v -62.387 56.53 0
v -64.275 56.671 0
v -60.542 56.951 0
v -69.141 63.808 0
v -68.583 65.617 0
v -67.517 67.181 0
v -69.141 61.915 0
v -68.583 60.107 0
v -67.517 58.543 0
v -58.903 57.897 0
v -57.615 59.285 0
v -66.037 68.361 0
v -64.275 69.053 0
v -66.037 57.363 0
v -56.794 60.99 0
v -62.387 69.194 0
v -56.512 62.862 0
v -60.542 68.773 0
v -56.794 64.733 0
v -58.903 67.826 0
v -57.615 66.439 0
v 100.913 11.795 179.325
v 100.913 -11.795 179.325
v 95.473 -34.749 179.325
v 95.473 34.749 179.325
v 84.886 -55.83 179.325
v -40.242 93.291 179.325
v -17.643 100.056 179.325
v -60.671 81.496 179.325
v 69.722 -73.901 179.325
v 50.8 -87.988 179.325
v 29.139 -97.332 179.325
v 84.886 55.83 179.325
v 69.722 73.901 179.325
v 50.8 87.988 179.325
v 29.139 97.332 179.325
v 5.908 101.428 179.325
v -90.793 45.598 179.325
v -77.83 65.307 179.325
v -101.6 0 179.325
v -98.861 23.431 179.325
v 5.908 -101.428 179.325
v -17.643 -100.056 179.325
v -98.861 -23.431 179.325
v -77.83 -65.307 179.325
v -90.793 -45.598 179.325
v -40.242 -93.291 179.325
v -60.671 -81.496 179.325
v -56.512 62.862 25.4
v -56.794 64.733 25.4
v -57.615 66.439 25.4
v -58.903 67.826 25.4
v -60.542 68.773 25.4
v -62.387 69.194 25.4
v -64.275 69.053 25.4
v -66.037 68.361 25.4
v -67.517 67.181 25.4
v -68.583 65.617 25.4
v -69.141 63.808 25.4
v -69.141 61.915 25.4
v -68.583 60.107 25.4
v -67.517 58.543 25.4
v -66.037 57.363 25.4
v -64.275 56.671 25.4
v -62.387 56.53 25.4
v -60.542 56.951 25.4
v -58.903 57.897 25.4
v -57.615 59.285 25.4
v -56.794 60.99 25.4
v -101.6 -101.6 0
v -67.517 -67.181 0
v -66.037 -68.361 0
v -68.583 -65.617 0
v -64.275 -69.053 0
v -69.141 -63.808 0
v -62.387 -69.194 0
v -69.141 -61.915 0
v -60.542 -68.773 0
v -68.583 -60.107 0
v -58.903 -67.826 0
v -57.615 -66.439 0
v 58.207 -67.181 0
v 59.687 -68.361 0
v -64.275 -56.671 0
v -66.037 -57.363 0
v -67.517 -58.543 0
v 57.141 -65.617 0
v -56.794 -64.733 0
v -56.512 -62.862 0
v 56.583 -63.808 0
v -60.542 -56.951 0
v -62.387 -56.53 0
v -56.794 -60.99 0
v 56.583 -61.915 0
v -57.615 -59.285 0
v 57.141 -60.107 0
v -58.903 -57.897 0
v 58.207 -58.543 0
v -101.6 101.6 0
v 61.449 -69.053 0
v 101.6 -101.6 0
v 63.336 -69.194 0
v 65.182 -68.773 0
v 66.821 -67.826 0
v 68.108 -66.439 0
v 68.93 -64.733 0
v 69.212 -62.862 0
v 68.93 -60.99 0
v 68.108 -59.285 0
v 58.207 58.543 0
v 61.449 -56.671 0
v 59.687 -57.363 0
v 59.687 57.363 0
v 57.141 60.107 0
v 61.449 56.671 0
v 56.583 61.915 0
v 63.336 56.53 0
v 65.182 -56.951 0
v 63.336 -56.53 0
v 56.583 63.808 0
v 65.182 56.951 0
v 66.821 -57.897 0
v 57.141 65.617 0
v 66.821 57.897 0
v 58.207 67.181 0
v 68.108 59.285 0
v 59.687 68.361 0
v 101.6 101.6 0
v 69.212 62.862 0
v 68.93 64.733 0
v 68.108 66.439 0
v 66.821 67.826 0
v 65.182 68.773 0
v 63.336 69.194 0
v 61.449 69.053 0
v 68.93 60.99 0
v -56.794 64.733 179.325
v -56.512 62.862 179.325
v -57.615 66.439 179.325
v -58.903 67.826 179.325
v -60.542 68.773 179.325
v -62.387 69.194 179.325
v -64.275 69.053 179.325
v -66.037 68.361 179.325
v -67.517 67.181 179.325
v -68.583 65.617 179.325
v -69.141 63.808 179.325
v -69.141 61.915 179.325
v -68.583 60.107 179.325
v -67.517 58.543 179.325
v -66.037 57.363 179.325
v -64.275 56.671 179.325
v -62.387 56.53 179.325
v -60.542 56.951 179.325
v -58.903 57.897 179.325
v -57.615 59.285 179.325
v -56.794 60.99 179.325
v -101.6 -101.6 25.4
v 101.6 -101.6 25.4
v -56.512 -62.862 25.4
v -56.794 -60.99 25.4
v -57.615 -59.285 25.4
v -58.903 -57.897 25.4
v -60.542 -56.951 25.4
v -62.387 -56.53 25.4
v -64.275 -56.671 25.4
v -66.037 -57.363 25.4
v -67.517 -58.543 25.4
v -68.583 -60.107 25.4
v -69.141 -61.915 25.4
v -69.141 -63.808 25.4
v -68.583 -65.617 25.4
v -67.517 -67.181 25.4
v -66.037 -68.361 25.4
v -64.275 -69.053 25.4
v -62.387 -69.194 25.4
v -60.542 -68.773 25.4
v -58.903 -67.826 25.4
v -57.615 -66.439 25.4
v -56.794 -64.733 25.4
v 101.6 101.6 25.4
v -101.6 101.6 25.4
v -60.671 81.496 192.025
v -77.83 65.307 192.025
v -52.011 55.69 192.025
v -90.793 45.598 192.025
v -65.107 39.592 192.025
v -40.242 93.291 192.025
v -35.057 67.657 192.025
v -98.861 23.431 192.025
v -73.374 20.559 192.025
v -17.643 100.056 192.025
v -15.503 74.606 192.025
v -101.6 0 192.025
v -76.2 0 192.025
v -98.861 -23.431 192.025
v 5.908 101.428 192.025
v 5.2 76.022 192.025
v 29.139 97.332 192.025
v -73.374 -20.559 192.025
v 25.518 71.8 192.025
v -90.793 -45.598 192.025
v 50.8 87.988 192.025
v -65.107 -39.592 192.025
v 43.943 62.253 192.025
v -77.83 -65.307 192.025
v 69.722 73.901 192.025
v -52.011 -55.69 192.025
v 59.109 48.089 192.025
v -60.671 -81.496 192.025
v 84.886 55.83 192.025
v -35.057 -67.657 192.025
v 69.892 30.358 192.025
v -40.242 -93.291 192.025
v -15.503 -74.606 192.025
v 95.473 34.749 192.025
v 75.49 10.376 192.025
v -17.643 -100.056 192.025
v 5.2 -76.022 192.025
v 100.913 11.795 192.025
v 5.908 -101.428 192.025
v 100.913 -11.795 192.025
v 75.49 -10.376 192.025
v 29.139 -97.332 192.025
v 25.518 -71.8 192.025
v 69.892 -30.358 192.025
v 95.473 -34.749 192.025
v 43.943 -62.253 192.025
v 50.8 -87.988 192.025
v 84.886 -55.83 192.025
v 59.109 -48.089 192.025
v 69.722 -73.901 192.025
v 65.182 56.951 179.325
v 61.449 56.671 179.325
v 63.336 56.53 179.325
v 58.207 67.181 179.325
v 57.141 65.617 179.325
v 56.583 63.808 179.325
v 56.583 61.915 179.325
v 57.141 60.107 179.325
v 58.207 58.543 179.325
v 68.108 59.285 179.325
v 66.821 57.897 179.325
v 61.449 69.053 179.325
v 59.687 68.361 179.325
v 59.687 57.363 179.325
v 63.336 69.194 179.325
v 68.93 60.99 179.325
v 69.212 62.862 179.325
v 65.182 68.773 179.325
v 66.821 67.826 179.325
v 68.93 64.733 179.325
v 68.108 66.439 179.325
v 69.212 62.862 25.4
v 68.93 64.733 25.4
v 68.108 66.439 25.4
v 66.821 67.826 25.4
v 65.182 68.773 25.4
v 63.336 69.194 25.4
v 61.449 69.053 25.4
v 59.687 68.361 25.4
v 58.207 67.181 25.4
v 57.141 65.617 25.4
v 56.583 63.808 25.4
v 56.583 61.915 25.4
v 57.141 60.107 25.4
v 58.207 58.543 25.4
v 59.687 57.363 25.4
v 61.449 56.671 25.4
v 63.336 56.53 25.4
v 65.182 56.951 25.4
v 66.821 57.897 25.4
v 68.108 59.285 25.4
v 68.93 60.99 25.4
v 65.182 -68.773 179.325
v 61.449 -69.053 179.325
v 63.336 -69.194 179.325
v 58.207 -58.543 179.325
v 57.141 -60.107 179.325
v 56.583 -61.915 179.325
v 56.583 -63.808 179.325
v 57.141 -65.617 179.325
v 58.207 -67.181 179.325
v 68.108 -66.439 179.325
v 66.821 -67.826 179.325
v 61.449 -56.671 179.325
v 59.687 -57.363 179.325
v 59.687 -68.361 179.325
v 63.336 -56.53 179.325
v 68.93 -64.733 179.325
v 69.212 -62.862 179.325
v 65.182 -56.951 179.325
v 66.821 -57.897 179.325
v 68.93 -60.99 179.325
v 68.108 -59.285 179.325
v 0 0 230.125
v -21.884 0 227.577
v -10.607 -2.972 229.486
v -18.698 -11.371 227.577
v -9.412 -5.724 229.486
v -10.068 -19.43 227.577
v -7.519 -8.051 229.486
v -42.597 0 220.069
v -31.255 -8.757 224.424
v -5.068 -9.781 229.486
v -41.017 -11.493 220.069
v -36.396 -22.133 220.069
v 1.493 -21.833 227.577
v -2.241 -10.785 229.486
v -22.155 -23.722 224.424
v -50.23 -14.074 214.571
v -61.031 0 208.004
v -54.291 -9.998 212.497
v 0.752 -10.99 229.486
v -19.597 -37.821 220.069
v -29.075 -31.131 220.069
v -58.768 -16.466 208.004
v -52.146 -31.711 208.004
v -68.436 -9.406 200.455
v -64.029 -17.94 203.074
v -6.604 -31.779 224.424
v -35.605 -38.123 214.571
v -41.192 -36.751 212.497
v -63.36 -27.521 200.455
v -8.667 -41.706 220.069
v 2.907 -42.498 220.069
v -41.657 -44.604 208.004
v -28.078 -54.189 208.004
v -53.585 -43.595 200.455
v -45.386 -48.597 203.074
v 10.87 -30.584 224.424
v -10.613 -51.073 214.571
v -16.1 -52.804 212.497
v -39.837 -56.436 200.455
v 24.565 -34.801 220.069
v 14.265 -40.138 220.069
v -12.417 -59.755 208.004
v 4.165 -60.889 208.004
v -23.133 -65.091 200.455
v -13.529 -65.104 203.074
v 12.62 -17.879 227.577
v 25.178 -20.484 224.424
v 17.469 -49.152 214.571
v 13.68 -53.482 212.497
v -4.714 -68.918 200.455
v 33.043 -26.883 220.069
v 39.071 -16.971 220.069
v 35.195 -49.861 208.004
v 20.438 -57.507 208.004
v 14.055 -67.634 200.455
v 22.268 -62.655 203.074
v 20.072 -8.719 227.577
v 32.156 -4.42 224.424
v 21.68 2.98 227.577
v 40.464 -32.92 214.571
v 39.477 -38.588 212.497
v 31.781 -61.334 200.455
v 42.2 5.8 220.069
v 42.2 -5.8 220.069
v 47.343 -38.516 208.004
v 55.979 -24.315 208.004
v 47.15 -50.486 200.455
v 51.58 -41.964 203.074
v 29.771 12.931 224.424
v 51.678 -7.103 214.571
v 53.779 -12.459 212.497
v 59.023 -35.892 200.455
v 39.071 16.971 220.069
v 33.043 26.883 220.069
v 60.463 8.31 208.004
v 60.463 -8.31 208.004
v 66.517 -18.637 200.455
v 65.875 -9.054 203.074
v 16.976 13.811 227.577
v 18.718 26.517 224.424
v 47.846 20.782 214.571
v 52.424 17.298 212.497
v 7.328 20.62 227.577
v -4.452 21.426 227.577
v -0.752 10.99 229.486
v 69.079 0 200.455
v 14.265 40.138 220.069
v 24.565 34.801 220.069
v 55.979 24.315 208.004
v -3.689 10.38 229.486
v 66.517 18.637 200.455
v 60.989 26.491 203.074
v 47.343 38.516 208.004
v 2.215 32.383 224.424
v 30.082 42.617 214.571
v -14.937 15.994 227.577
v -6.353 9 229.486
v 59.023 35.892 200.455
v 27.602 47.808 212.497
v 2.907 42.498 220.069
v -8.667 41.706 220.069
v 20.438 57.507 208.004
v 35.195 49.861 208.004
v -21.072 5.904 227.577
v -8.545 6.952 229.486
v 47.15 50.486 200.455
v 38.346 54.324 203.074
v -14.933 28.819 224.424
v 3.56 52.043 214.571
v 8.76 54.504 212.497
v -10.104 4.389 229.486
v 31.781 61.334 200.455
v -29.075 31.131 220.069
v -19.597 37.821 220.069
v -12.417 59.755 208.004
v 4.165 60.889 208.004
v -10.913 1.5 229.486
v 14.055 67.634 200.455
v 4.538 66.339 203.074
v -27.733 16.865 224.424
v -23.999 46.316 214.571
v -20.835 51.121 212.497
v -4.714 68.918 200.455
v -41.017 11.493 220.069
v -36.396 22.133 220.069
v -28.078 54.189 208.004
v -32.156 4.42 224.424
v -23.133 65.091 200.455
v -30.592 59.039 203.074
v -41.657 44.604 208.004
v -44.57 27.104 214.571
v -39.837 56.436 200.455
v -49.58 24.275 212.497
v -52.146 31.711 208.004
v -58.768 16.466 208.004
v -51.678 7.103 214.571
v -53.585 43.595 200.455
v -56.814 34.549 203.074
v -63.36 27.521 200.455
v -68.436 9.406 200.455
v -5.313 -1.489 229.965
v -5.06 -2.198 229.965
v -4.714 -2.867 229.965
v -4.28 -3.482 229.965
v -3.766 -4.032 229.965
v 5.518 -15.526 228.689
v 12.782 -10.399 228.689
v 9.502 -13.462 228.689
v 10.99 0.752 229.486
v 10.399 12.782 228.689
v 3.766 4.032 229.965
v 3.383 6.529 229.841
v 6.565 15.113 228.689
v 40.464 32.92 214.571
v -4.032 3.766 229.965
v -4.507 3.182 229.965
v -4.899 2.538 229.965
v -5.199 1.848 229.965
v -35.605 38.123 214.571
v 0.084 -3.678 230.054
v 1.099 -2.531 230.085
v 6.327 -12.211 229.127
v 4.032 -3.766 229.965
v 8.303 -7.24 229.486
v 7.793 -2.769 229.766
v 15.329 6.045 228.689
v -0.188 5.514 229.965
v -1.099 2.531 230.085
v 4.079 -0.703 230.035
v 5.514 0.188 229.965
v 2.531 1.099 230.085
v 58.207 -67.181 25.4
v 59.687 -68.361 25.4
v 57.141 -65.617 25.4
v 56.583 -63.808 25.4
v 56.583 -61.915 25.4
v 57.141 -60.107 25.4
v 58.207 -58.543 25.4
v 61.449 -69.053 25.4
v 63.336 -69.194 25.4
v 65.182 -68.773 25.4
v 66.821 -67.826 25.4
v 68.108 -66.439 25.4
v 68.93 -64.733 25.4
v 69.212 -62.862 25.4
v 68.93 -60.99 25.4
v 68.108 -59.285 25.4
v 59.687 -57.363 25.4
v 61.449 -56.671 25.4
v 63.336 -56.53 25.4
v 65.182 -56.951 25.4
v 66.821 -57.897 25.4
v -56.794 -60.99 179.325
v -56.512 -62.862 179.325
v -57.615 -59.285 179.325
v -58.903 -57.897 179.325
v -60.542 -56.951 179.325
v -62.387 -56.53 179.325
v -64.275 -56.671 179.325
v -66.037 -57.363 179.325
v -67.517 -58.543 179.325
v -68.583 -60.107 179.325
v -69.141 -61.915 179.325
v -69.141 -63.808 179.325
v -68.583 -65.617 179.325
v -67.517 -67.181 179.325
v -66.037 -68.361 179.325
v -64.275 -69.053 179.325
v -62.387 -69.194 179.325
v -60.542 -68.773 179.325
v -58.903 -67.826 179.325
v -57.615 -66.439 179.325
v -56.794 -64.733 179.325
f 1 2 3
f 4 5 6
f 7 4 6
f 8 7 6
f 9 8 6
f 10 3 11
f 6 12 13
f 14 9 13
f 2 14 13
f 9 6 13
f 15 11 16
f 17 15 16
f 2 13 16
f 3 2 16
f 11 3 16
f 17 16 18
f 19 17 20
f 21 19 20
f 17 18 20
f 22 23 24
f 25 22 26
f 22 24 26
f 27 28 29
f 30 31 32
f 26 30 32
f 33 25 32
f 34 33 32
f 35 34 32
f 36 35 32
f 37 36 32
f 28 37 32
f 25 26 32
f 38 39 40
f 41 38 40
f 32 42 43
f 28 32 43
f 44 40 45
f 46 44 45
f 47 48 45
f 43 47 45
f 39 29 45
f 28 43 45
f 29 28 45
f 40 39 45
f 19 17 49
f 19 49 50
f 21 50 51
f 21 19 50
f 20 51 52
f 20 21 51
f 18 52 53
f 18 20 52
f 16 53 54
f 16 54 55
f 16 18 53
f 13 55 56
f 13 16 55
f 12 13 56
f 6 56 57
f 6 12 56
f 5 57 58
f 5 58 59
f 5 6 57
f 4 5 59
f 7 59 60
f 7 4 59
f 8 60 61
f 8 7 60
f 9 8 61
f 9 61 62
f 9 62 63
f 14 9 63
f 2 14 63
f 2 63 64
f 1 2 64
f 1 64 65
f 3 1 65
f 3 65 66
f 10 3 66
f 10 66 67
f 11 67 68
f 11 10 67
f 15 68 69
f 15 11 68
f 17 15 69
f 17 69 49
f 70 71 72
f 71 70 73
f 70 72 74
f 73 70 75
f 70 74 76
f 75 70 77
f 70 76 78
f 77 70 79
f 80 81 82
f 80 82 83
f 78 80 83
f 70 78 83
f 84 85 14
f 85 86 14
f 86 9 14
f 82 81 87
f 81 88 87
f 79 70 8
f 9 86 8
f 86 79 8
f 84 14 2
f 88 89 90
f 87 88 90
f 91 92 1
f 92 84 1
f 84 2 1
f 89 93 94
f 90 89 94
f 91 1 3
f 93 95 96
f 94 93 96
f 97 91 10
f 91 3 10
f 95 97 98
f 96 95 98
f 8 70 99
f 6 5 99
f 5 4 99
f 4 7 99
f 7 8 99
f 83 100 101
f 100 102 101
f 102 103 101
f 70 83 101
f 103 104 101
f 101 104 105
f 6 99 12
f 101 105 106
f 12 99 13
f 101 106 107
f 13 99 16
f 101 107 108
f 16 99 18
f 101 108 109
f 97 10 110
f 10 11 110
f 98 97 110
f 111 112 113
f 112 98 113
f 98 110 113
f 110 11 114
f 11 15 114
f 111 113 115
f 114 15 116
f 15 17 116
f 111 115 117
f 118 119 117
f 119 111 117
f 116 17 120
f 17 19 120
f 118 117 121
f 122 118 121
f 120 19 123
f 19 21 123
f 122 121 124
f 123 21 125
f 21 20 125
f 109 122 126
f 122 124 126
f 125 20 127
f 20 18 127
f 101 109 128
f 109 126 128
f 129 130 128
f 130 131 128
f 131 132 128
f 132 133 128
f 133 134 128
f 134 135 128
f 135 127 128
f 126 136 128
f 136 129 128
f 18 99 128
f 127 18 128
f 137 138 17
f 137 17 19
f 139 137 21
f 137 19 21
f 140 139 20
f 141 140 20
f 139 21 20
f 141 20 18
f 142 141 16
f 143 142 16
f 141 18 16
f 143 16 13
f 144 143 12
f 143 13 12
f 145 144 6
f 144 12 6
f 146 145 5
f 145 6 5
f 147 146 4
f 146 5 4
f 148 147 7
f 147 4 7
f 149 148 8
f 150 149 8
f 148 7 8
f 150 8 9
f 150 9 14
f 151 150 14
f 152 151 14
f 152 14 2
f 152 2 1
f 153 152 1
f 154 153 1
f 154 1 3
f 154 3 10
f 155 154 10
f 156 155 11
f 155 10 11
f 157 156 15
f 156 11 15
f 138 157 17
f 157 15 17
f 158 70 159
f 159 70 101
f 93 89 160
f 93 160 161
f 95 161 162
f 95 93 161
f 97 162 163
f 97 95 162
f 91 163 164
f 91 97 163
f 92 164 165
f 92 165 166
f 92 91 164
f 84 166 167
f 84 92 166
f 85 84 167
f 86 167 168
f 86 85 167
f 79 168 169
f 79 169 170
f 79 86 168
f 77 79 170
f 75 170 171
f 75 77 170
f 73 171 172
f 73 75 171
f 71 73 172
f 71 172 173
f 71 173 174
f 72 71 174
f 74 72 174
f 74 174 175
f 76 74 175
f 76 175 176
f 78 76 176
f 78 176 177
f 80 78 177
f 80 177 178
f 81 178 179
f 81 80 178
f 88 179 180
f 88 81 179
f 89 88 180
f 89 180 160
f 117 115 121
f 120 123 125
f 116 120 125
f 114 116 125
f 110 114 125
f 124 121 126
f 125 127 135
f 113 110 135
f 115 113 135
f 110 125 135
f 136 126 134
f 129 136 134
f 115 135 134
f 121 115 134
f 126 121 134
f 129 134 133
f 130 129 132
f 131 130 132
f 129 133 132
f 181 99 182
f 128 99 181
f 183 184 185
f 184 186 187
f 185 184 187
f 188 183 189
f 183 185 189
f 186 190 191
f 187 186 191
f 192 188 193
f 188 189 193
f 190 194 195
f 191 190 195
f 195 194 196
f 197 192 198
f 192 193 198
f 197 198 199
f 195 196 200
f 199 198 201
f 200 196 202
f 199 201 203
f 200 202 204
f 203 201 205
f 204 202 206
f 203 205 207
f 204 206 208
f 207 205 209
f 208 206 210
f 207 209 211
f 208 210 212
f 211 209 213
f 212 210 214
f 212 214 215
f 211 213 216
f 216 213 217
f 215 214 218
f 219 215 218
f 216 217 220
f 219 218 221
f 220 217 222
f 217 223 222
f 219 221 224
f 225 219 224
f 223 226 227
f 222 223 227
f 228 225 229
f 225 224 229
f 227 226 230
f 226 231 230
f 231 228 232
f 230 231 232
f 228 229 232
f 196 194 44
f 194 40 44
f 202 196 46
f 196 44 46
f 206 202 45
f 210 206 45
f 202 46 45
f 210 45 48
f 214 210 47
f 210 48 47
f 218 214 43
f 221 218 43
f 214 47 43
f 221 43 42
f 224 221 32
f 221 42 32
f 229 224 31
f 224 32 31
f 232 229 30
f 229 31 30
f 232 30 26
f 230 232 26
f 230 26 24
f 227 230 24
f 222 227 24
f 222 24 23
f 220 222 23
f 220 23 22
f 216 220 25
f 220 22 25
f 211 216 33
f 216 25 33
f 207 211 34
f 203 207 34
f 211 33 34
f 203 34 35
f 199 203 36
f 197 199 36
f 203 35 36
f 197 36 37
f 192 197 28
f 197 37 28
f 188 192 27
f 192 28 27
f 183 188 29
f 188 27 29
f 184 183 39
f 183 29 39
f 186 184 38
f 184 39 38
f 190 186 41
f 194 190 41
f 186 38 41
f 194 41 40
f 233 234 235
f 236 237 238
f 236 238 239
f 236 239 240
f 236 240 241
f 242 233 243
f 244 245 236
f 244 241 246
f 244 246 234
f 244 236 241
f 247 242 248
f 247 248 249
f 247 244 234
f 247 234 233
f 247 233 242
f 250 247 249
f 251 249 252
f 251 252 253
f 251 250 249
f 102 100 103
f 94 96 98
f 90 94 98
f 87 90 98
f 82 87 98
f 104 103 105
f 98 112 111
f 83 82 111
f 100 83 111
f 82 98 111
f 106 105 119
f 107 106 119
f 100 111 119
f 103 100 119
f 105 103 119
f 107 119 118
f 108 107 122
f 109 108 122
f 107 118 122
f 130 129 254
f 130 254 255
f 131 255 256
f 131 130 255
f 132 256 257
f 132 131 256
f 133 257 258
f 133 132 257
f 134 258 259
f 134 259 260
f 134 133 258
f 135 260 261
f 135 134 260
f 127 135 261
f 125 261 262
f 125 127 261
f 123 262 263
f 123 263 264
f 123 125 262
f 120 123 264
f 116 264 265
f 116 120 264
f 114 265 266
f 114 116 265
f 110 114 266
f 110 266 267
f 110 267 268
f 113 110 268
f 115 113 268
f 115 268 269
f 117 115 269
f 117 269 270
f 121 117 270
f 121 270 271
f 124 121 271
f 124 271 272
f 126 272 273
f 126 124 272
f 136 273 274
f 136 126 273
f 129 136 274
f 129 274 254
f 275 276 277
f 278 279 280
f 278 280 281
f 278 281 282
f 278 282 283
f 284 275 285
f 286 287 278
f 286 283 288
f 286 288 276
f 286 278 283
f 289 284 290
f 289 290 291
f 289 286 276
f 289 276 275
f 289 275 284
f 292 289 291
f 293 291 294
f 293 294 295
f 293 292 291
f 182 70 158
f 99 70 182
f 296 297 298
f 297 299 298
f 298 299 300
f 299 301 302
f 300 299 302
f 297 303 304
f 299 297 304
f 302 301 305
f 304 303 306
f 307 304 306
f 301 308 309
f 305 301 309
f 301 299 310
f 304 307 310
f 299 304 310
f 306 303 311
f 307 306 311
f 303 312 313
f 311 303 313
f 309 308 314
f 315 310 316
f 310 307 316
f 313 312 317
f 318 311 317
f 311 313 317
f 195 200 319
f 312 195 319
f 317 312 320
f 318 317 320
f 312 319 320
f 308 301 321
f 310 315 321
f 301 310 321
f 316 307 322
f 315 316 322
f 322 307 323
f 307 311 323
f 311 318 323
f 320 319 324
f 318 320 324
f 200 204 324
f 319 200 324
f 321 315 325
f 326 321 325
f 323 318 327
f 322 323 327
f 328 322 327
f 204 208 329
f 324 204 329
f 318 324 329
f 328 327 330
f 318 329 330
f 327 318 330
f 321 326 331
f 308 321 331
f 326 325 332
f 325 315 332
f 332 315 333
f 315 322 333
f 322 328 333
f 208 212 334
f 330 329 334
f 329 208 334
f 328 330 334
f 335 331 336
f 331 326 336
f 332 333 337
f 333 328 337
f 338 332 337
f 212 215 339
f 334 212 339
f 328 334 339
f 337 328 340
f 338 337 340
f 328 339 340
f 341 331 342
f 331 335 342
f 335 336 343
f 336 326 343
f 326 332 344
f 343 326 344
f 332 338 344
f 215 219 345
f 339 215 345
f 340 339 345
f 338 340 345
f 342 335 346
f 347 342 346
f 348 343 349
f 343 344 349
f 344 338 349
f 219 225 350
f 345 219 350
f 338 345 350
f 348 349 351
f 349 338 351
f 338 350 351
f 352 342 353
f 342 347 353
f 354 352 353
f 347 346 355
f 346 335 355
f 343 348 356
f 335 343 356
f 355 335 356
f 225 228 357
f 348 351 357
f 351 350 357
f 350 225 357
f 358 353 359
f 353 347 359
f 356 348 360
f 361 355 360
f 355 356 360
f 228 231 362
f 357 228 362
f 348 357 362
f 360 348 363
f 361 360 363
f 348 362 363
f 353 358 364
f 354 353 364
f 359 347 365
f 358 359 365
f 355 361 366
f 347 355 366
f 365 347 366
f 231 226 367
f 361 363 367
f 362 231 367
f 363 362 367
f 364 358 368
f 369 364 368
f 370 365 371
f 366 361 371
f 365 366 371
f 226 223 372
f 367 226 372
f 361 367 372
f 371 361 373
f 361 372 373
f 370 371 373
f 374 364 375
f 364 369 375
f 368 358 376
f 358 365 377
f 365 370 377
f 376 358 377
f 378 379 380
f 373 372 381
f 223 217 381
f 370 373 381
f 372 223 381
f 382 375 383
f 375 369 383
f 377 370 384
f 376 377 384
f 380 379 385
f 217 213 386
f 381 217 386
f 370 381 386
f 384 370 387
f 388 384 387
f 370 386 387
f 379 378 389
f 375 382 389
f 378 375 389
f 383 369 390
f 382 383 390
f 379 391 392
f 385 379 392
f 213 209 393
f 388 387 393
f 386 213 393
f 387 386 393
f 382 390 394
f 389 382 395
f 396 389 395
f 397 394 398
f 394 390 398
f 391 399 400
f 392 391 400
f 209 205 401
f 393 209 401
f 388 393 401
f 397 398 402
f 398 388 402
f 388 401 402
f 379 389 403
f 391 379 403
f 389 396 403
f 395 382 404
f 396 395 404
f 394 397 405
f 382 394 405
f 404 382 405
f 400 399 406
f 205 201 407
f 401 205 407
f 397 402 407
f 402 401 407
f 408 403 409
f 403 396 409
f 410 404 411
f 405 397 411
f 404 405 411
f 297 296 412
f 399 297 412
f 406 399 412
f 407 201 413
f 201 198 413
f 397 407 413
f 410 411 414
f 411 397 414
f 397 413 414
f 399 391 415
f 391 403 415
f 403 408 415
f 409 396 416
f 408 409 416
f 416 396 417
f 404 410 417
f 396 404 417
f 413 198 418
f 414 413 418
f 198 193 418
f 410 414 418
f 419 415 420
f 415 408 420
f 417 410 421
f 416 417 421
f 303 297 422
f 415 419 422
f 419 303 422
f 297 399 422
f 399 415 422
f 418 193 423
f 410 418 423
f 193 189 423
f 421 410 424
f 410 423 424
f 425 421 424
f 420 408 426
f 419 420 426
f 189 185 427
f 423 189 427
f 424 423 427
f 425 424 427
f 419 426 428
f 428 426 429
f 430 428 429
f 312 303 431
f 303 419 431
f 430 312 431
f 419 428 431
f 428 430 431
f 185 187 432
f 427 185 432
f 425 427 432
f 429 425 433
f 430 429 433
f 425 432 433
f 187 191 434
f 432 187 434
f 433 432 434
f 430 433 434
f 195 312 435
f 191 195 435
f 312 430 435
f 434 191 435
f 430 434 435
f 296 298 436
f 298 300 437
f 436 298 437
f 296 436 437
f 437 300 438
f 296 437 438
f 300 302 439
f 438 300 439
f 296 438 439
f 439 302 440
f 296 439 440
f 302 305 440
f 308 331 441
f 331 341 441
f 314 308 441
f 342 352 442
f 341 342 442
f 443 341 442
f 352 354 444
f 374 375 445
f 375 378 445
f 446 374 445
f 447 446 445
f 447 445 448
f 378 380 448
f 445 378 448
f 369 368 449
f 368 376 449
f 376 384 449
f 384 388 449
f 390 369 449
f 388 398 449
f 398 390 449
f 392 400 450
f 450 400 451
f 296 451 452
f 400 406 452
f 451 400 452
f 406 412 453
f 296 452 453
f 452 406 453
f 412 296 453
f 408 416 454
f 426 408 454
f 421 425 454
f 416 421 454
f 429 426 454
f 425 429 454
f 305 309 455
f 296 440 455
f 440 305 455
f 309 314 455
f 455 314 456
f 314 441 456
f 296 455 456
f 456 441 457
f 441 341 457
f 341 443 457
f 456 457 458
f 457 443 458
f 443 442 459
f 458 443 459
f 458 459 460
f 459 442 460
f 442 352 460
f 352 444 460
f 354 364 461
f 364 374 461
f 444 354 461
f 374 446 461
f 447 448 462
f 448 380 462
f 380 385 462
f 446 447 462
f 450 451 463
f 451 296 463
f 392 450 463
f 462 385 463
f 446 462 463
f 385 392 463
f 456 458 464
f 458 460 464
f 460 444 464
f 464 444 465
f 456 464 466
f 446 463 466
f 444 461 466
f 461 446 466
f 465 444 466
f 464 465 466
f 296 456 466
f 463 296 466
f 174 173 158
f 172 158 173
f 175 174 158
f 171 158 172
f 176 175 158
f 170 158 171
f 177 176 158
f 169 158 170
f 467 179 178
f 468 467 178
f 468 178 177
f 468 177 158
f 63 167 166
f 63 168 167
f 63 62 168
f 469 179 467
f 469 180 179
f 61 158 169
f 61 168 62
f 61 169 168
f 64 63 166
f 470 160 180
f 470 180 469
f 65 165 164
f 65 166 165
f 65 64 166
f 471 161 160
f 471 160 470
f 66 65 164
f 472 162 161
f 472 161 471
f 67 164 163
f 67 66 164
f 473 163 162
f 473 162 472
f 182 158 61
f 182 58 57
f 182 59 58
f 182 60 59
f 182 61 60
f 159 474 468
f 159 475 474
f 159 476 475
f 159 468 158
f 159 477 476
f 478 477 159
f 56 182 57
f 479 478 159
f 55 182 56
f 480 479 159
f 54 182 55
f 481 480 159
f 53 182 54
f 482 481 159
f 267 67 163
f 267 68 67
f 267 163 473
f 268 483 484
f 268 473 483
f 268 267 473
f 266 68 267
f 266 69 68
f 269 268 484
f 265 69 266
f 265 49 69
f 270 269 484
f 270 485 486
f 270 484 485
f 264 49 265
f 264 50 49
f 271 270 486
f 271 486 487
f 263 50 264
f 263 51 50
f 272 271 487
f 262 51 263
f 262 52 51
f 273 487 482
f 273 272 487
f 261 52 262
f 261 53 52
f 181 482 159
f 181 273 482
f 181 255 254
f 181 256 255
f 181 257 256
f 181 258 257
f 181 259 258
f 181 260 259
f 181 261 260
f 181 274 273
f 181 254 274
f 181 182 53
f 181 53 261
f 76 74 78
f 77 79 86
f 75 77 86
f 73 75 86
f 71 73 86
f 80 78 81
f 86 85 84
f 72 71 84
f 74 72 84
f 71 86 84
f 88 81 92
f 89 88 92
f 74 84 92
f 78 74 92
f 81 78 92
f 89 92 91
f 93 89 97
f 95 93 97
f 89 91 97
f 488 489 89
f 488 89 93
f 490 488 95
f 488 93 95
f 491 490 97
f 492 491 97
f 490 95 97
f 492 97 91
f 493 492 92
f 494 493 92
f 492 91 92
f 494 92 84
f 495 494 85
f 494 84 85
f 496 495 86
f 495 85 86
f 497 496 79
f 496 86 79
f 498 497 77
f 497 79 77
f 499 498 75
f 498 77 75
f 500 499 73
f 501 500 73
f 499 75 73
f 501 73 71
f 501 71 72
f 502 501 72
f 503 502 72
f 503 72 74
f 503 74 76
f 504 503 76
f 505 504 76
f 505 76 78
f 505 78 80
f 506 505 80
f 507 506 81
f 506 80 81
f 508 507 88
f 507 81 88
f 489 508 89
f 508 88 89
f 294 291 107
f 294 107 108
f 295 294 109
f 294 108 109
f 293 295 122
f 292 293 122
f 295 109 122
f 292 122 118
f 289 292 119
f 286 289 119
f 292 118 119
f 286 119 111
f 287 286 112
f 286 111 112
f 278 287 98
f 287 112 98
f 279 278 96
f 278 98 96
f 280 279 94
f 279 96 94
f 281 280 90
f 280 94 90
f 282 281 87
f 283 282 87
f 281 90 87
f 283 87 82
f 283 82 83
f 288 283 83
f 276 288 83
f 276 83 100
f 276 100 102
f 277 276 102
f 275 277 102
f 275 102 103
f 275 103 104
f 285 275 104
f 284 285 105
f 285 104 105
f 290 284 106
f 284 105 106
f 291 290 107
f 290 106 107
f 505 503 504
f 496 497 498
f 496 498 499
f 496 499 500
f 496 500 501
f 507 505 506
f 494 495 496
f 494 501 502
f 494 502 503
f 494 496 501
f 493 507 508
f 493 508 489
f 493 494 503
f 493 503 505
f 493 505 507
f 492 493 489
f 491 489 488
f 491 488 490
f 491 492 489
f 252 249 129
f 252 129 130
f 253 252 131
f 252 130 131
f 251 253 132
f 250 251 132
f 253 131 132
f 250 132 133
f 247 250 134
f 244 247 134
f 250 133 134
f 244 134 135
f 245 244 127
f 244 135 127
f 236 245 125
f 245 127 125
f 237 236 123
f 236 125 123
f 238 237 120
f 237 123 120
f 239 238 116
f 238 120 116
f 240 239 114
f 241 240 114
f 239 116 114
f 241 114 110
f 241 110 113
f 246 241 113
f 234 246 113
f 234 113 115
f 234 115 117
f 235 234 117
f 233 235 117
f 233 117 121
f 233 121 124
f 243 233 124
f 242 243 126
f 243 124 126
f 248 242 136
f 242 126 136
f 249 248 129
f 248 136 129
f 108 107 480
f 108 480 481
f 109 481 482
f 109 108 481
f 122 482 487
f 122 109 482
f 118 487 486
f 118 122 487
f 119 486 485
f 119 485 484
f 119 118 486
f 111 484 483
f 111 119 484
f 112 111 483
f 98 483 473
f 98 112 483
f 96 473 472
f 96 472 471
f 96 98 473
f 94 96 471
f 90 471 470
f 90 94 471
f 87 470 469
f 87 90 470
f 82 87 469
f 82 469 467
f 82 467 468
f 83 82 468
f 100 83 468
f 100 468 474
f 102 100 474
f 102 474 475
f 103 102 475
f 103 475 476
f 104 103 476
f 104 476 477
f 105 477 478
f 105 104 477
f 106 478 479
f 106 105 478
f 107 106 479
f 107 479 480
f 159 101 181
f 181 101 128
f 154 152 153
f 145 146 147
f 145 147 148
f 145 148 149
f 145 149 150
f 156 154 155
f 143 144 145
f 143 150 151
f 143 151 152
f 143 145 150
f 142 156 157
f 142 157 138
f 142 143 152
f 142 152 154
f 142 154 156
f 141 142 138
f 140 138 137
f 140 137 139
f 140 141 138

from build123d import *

# Parameters (mm, degrees)
F0_W     = 203.2
F0_H     = 203.2
F0_R     = 6.35
F1_DEPTH = 25.4
F4_DEPTH = 179.325295


with BuildPart() as f1:
    # F0 (on Top) → F1 (new body)
    with BuildSketch(Plane.XY):
        Rectangle(F0_W, F0_H)
        with Locations((-62.861793, -62.861793)):
            Circle(F0_R, mode=Mode.SUBTRACT)
        with Locations((62.861793, -62.861793)):
            Circle(F0_R, mode=Mode.SUBTRACT)
        with Locations((-62.861793, 62.861793)):
            Circle(F0_R, mode=Mode.SUBTRACT)
        with Locations((62.861793, 62.861793)):
            Circle(F0_R, mode=Mode.SUBTRACT)
    extrude(amount=F1_DEPTH)


with BuildPart() as f3:
    # F2 (on Front) → F3 (revolve)
    with BuildSketch(Plane.XZ):
        with BuildLine():
            Line((-101.6, 179.325295), (0, 179.325295))
            Line((0, 179.325295), (0, 230.125295))
            ThreePointArc((0, 230.125295), (-42.597095, 220.069485), (-76.2, 192.025295))
            Line((-76.2, 192.025295), (-101.6, 192.025295))
            Line((-101.6, 192.025295), (-101.6, 179.325295))
        make_face()
    revolve(axis=Axis((0, 0, 204.725295), (0, 0, 1)))


with BuildPart() as f4:
    # F0 (on Top) → F4 (new body, through all)
    with BuildSketch(Plane.XY):
        with Locations((62.861793, -62.861793)):
            Circle(F0_R)
        with Locations((62.861793, 62.861793)):
            Circle(F0_R)
        with Locations((-62.861793, 62.861793)):
            Circle(F0_R)
        with Locations((-62.861793, -62.861793)):
            Circle(F0_R)
    extrude(amount=F4_DEPTH)


solid = Compound([f1.part, f3.part, f4.part])
